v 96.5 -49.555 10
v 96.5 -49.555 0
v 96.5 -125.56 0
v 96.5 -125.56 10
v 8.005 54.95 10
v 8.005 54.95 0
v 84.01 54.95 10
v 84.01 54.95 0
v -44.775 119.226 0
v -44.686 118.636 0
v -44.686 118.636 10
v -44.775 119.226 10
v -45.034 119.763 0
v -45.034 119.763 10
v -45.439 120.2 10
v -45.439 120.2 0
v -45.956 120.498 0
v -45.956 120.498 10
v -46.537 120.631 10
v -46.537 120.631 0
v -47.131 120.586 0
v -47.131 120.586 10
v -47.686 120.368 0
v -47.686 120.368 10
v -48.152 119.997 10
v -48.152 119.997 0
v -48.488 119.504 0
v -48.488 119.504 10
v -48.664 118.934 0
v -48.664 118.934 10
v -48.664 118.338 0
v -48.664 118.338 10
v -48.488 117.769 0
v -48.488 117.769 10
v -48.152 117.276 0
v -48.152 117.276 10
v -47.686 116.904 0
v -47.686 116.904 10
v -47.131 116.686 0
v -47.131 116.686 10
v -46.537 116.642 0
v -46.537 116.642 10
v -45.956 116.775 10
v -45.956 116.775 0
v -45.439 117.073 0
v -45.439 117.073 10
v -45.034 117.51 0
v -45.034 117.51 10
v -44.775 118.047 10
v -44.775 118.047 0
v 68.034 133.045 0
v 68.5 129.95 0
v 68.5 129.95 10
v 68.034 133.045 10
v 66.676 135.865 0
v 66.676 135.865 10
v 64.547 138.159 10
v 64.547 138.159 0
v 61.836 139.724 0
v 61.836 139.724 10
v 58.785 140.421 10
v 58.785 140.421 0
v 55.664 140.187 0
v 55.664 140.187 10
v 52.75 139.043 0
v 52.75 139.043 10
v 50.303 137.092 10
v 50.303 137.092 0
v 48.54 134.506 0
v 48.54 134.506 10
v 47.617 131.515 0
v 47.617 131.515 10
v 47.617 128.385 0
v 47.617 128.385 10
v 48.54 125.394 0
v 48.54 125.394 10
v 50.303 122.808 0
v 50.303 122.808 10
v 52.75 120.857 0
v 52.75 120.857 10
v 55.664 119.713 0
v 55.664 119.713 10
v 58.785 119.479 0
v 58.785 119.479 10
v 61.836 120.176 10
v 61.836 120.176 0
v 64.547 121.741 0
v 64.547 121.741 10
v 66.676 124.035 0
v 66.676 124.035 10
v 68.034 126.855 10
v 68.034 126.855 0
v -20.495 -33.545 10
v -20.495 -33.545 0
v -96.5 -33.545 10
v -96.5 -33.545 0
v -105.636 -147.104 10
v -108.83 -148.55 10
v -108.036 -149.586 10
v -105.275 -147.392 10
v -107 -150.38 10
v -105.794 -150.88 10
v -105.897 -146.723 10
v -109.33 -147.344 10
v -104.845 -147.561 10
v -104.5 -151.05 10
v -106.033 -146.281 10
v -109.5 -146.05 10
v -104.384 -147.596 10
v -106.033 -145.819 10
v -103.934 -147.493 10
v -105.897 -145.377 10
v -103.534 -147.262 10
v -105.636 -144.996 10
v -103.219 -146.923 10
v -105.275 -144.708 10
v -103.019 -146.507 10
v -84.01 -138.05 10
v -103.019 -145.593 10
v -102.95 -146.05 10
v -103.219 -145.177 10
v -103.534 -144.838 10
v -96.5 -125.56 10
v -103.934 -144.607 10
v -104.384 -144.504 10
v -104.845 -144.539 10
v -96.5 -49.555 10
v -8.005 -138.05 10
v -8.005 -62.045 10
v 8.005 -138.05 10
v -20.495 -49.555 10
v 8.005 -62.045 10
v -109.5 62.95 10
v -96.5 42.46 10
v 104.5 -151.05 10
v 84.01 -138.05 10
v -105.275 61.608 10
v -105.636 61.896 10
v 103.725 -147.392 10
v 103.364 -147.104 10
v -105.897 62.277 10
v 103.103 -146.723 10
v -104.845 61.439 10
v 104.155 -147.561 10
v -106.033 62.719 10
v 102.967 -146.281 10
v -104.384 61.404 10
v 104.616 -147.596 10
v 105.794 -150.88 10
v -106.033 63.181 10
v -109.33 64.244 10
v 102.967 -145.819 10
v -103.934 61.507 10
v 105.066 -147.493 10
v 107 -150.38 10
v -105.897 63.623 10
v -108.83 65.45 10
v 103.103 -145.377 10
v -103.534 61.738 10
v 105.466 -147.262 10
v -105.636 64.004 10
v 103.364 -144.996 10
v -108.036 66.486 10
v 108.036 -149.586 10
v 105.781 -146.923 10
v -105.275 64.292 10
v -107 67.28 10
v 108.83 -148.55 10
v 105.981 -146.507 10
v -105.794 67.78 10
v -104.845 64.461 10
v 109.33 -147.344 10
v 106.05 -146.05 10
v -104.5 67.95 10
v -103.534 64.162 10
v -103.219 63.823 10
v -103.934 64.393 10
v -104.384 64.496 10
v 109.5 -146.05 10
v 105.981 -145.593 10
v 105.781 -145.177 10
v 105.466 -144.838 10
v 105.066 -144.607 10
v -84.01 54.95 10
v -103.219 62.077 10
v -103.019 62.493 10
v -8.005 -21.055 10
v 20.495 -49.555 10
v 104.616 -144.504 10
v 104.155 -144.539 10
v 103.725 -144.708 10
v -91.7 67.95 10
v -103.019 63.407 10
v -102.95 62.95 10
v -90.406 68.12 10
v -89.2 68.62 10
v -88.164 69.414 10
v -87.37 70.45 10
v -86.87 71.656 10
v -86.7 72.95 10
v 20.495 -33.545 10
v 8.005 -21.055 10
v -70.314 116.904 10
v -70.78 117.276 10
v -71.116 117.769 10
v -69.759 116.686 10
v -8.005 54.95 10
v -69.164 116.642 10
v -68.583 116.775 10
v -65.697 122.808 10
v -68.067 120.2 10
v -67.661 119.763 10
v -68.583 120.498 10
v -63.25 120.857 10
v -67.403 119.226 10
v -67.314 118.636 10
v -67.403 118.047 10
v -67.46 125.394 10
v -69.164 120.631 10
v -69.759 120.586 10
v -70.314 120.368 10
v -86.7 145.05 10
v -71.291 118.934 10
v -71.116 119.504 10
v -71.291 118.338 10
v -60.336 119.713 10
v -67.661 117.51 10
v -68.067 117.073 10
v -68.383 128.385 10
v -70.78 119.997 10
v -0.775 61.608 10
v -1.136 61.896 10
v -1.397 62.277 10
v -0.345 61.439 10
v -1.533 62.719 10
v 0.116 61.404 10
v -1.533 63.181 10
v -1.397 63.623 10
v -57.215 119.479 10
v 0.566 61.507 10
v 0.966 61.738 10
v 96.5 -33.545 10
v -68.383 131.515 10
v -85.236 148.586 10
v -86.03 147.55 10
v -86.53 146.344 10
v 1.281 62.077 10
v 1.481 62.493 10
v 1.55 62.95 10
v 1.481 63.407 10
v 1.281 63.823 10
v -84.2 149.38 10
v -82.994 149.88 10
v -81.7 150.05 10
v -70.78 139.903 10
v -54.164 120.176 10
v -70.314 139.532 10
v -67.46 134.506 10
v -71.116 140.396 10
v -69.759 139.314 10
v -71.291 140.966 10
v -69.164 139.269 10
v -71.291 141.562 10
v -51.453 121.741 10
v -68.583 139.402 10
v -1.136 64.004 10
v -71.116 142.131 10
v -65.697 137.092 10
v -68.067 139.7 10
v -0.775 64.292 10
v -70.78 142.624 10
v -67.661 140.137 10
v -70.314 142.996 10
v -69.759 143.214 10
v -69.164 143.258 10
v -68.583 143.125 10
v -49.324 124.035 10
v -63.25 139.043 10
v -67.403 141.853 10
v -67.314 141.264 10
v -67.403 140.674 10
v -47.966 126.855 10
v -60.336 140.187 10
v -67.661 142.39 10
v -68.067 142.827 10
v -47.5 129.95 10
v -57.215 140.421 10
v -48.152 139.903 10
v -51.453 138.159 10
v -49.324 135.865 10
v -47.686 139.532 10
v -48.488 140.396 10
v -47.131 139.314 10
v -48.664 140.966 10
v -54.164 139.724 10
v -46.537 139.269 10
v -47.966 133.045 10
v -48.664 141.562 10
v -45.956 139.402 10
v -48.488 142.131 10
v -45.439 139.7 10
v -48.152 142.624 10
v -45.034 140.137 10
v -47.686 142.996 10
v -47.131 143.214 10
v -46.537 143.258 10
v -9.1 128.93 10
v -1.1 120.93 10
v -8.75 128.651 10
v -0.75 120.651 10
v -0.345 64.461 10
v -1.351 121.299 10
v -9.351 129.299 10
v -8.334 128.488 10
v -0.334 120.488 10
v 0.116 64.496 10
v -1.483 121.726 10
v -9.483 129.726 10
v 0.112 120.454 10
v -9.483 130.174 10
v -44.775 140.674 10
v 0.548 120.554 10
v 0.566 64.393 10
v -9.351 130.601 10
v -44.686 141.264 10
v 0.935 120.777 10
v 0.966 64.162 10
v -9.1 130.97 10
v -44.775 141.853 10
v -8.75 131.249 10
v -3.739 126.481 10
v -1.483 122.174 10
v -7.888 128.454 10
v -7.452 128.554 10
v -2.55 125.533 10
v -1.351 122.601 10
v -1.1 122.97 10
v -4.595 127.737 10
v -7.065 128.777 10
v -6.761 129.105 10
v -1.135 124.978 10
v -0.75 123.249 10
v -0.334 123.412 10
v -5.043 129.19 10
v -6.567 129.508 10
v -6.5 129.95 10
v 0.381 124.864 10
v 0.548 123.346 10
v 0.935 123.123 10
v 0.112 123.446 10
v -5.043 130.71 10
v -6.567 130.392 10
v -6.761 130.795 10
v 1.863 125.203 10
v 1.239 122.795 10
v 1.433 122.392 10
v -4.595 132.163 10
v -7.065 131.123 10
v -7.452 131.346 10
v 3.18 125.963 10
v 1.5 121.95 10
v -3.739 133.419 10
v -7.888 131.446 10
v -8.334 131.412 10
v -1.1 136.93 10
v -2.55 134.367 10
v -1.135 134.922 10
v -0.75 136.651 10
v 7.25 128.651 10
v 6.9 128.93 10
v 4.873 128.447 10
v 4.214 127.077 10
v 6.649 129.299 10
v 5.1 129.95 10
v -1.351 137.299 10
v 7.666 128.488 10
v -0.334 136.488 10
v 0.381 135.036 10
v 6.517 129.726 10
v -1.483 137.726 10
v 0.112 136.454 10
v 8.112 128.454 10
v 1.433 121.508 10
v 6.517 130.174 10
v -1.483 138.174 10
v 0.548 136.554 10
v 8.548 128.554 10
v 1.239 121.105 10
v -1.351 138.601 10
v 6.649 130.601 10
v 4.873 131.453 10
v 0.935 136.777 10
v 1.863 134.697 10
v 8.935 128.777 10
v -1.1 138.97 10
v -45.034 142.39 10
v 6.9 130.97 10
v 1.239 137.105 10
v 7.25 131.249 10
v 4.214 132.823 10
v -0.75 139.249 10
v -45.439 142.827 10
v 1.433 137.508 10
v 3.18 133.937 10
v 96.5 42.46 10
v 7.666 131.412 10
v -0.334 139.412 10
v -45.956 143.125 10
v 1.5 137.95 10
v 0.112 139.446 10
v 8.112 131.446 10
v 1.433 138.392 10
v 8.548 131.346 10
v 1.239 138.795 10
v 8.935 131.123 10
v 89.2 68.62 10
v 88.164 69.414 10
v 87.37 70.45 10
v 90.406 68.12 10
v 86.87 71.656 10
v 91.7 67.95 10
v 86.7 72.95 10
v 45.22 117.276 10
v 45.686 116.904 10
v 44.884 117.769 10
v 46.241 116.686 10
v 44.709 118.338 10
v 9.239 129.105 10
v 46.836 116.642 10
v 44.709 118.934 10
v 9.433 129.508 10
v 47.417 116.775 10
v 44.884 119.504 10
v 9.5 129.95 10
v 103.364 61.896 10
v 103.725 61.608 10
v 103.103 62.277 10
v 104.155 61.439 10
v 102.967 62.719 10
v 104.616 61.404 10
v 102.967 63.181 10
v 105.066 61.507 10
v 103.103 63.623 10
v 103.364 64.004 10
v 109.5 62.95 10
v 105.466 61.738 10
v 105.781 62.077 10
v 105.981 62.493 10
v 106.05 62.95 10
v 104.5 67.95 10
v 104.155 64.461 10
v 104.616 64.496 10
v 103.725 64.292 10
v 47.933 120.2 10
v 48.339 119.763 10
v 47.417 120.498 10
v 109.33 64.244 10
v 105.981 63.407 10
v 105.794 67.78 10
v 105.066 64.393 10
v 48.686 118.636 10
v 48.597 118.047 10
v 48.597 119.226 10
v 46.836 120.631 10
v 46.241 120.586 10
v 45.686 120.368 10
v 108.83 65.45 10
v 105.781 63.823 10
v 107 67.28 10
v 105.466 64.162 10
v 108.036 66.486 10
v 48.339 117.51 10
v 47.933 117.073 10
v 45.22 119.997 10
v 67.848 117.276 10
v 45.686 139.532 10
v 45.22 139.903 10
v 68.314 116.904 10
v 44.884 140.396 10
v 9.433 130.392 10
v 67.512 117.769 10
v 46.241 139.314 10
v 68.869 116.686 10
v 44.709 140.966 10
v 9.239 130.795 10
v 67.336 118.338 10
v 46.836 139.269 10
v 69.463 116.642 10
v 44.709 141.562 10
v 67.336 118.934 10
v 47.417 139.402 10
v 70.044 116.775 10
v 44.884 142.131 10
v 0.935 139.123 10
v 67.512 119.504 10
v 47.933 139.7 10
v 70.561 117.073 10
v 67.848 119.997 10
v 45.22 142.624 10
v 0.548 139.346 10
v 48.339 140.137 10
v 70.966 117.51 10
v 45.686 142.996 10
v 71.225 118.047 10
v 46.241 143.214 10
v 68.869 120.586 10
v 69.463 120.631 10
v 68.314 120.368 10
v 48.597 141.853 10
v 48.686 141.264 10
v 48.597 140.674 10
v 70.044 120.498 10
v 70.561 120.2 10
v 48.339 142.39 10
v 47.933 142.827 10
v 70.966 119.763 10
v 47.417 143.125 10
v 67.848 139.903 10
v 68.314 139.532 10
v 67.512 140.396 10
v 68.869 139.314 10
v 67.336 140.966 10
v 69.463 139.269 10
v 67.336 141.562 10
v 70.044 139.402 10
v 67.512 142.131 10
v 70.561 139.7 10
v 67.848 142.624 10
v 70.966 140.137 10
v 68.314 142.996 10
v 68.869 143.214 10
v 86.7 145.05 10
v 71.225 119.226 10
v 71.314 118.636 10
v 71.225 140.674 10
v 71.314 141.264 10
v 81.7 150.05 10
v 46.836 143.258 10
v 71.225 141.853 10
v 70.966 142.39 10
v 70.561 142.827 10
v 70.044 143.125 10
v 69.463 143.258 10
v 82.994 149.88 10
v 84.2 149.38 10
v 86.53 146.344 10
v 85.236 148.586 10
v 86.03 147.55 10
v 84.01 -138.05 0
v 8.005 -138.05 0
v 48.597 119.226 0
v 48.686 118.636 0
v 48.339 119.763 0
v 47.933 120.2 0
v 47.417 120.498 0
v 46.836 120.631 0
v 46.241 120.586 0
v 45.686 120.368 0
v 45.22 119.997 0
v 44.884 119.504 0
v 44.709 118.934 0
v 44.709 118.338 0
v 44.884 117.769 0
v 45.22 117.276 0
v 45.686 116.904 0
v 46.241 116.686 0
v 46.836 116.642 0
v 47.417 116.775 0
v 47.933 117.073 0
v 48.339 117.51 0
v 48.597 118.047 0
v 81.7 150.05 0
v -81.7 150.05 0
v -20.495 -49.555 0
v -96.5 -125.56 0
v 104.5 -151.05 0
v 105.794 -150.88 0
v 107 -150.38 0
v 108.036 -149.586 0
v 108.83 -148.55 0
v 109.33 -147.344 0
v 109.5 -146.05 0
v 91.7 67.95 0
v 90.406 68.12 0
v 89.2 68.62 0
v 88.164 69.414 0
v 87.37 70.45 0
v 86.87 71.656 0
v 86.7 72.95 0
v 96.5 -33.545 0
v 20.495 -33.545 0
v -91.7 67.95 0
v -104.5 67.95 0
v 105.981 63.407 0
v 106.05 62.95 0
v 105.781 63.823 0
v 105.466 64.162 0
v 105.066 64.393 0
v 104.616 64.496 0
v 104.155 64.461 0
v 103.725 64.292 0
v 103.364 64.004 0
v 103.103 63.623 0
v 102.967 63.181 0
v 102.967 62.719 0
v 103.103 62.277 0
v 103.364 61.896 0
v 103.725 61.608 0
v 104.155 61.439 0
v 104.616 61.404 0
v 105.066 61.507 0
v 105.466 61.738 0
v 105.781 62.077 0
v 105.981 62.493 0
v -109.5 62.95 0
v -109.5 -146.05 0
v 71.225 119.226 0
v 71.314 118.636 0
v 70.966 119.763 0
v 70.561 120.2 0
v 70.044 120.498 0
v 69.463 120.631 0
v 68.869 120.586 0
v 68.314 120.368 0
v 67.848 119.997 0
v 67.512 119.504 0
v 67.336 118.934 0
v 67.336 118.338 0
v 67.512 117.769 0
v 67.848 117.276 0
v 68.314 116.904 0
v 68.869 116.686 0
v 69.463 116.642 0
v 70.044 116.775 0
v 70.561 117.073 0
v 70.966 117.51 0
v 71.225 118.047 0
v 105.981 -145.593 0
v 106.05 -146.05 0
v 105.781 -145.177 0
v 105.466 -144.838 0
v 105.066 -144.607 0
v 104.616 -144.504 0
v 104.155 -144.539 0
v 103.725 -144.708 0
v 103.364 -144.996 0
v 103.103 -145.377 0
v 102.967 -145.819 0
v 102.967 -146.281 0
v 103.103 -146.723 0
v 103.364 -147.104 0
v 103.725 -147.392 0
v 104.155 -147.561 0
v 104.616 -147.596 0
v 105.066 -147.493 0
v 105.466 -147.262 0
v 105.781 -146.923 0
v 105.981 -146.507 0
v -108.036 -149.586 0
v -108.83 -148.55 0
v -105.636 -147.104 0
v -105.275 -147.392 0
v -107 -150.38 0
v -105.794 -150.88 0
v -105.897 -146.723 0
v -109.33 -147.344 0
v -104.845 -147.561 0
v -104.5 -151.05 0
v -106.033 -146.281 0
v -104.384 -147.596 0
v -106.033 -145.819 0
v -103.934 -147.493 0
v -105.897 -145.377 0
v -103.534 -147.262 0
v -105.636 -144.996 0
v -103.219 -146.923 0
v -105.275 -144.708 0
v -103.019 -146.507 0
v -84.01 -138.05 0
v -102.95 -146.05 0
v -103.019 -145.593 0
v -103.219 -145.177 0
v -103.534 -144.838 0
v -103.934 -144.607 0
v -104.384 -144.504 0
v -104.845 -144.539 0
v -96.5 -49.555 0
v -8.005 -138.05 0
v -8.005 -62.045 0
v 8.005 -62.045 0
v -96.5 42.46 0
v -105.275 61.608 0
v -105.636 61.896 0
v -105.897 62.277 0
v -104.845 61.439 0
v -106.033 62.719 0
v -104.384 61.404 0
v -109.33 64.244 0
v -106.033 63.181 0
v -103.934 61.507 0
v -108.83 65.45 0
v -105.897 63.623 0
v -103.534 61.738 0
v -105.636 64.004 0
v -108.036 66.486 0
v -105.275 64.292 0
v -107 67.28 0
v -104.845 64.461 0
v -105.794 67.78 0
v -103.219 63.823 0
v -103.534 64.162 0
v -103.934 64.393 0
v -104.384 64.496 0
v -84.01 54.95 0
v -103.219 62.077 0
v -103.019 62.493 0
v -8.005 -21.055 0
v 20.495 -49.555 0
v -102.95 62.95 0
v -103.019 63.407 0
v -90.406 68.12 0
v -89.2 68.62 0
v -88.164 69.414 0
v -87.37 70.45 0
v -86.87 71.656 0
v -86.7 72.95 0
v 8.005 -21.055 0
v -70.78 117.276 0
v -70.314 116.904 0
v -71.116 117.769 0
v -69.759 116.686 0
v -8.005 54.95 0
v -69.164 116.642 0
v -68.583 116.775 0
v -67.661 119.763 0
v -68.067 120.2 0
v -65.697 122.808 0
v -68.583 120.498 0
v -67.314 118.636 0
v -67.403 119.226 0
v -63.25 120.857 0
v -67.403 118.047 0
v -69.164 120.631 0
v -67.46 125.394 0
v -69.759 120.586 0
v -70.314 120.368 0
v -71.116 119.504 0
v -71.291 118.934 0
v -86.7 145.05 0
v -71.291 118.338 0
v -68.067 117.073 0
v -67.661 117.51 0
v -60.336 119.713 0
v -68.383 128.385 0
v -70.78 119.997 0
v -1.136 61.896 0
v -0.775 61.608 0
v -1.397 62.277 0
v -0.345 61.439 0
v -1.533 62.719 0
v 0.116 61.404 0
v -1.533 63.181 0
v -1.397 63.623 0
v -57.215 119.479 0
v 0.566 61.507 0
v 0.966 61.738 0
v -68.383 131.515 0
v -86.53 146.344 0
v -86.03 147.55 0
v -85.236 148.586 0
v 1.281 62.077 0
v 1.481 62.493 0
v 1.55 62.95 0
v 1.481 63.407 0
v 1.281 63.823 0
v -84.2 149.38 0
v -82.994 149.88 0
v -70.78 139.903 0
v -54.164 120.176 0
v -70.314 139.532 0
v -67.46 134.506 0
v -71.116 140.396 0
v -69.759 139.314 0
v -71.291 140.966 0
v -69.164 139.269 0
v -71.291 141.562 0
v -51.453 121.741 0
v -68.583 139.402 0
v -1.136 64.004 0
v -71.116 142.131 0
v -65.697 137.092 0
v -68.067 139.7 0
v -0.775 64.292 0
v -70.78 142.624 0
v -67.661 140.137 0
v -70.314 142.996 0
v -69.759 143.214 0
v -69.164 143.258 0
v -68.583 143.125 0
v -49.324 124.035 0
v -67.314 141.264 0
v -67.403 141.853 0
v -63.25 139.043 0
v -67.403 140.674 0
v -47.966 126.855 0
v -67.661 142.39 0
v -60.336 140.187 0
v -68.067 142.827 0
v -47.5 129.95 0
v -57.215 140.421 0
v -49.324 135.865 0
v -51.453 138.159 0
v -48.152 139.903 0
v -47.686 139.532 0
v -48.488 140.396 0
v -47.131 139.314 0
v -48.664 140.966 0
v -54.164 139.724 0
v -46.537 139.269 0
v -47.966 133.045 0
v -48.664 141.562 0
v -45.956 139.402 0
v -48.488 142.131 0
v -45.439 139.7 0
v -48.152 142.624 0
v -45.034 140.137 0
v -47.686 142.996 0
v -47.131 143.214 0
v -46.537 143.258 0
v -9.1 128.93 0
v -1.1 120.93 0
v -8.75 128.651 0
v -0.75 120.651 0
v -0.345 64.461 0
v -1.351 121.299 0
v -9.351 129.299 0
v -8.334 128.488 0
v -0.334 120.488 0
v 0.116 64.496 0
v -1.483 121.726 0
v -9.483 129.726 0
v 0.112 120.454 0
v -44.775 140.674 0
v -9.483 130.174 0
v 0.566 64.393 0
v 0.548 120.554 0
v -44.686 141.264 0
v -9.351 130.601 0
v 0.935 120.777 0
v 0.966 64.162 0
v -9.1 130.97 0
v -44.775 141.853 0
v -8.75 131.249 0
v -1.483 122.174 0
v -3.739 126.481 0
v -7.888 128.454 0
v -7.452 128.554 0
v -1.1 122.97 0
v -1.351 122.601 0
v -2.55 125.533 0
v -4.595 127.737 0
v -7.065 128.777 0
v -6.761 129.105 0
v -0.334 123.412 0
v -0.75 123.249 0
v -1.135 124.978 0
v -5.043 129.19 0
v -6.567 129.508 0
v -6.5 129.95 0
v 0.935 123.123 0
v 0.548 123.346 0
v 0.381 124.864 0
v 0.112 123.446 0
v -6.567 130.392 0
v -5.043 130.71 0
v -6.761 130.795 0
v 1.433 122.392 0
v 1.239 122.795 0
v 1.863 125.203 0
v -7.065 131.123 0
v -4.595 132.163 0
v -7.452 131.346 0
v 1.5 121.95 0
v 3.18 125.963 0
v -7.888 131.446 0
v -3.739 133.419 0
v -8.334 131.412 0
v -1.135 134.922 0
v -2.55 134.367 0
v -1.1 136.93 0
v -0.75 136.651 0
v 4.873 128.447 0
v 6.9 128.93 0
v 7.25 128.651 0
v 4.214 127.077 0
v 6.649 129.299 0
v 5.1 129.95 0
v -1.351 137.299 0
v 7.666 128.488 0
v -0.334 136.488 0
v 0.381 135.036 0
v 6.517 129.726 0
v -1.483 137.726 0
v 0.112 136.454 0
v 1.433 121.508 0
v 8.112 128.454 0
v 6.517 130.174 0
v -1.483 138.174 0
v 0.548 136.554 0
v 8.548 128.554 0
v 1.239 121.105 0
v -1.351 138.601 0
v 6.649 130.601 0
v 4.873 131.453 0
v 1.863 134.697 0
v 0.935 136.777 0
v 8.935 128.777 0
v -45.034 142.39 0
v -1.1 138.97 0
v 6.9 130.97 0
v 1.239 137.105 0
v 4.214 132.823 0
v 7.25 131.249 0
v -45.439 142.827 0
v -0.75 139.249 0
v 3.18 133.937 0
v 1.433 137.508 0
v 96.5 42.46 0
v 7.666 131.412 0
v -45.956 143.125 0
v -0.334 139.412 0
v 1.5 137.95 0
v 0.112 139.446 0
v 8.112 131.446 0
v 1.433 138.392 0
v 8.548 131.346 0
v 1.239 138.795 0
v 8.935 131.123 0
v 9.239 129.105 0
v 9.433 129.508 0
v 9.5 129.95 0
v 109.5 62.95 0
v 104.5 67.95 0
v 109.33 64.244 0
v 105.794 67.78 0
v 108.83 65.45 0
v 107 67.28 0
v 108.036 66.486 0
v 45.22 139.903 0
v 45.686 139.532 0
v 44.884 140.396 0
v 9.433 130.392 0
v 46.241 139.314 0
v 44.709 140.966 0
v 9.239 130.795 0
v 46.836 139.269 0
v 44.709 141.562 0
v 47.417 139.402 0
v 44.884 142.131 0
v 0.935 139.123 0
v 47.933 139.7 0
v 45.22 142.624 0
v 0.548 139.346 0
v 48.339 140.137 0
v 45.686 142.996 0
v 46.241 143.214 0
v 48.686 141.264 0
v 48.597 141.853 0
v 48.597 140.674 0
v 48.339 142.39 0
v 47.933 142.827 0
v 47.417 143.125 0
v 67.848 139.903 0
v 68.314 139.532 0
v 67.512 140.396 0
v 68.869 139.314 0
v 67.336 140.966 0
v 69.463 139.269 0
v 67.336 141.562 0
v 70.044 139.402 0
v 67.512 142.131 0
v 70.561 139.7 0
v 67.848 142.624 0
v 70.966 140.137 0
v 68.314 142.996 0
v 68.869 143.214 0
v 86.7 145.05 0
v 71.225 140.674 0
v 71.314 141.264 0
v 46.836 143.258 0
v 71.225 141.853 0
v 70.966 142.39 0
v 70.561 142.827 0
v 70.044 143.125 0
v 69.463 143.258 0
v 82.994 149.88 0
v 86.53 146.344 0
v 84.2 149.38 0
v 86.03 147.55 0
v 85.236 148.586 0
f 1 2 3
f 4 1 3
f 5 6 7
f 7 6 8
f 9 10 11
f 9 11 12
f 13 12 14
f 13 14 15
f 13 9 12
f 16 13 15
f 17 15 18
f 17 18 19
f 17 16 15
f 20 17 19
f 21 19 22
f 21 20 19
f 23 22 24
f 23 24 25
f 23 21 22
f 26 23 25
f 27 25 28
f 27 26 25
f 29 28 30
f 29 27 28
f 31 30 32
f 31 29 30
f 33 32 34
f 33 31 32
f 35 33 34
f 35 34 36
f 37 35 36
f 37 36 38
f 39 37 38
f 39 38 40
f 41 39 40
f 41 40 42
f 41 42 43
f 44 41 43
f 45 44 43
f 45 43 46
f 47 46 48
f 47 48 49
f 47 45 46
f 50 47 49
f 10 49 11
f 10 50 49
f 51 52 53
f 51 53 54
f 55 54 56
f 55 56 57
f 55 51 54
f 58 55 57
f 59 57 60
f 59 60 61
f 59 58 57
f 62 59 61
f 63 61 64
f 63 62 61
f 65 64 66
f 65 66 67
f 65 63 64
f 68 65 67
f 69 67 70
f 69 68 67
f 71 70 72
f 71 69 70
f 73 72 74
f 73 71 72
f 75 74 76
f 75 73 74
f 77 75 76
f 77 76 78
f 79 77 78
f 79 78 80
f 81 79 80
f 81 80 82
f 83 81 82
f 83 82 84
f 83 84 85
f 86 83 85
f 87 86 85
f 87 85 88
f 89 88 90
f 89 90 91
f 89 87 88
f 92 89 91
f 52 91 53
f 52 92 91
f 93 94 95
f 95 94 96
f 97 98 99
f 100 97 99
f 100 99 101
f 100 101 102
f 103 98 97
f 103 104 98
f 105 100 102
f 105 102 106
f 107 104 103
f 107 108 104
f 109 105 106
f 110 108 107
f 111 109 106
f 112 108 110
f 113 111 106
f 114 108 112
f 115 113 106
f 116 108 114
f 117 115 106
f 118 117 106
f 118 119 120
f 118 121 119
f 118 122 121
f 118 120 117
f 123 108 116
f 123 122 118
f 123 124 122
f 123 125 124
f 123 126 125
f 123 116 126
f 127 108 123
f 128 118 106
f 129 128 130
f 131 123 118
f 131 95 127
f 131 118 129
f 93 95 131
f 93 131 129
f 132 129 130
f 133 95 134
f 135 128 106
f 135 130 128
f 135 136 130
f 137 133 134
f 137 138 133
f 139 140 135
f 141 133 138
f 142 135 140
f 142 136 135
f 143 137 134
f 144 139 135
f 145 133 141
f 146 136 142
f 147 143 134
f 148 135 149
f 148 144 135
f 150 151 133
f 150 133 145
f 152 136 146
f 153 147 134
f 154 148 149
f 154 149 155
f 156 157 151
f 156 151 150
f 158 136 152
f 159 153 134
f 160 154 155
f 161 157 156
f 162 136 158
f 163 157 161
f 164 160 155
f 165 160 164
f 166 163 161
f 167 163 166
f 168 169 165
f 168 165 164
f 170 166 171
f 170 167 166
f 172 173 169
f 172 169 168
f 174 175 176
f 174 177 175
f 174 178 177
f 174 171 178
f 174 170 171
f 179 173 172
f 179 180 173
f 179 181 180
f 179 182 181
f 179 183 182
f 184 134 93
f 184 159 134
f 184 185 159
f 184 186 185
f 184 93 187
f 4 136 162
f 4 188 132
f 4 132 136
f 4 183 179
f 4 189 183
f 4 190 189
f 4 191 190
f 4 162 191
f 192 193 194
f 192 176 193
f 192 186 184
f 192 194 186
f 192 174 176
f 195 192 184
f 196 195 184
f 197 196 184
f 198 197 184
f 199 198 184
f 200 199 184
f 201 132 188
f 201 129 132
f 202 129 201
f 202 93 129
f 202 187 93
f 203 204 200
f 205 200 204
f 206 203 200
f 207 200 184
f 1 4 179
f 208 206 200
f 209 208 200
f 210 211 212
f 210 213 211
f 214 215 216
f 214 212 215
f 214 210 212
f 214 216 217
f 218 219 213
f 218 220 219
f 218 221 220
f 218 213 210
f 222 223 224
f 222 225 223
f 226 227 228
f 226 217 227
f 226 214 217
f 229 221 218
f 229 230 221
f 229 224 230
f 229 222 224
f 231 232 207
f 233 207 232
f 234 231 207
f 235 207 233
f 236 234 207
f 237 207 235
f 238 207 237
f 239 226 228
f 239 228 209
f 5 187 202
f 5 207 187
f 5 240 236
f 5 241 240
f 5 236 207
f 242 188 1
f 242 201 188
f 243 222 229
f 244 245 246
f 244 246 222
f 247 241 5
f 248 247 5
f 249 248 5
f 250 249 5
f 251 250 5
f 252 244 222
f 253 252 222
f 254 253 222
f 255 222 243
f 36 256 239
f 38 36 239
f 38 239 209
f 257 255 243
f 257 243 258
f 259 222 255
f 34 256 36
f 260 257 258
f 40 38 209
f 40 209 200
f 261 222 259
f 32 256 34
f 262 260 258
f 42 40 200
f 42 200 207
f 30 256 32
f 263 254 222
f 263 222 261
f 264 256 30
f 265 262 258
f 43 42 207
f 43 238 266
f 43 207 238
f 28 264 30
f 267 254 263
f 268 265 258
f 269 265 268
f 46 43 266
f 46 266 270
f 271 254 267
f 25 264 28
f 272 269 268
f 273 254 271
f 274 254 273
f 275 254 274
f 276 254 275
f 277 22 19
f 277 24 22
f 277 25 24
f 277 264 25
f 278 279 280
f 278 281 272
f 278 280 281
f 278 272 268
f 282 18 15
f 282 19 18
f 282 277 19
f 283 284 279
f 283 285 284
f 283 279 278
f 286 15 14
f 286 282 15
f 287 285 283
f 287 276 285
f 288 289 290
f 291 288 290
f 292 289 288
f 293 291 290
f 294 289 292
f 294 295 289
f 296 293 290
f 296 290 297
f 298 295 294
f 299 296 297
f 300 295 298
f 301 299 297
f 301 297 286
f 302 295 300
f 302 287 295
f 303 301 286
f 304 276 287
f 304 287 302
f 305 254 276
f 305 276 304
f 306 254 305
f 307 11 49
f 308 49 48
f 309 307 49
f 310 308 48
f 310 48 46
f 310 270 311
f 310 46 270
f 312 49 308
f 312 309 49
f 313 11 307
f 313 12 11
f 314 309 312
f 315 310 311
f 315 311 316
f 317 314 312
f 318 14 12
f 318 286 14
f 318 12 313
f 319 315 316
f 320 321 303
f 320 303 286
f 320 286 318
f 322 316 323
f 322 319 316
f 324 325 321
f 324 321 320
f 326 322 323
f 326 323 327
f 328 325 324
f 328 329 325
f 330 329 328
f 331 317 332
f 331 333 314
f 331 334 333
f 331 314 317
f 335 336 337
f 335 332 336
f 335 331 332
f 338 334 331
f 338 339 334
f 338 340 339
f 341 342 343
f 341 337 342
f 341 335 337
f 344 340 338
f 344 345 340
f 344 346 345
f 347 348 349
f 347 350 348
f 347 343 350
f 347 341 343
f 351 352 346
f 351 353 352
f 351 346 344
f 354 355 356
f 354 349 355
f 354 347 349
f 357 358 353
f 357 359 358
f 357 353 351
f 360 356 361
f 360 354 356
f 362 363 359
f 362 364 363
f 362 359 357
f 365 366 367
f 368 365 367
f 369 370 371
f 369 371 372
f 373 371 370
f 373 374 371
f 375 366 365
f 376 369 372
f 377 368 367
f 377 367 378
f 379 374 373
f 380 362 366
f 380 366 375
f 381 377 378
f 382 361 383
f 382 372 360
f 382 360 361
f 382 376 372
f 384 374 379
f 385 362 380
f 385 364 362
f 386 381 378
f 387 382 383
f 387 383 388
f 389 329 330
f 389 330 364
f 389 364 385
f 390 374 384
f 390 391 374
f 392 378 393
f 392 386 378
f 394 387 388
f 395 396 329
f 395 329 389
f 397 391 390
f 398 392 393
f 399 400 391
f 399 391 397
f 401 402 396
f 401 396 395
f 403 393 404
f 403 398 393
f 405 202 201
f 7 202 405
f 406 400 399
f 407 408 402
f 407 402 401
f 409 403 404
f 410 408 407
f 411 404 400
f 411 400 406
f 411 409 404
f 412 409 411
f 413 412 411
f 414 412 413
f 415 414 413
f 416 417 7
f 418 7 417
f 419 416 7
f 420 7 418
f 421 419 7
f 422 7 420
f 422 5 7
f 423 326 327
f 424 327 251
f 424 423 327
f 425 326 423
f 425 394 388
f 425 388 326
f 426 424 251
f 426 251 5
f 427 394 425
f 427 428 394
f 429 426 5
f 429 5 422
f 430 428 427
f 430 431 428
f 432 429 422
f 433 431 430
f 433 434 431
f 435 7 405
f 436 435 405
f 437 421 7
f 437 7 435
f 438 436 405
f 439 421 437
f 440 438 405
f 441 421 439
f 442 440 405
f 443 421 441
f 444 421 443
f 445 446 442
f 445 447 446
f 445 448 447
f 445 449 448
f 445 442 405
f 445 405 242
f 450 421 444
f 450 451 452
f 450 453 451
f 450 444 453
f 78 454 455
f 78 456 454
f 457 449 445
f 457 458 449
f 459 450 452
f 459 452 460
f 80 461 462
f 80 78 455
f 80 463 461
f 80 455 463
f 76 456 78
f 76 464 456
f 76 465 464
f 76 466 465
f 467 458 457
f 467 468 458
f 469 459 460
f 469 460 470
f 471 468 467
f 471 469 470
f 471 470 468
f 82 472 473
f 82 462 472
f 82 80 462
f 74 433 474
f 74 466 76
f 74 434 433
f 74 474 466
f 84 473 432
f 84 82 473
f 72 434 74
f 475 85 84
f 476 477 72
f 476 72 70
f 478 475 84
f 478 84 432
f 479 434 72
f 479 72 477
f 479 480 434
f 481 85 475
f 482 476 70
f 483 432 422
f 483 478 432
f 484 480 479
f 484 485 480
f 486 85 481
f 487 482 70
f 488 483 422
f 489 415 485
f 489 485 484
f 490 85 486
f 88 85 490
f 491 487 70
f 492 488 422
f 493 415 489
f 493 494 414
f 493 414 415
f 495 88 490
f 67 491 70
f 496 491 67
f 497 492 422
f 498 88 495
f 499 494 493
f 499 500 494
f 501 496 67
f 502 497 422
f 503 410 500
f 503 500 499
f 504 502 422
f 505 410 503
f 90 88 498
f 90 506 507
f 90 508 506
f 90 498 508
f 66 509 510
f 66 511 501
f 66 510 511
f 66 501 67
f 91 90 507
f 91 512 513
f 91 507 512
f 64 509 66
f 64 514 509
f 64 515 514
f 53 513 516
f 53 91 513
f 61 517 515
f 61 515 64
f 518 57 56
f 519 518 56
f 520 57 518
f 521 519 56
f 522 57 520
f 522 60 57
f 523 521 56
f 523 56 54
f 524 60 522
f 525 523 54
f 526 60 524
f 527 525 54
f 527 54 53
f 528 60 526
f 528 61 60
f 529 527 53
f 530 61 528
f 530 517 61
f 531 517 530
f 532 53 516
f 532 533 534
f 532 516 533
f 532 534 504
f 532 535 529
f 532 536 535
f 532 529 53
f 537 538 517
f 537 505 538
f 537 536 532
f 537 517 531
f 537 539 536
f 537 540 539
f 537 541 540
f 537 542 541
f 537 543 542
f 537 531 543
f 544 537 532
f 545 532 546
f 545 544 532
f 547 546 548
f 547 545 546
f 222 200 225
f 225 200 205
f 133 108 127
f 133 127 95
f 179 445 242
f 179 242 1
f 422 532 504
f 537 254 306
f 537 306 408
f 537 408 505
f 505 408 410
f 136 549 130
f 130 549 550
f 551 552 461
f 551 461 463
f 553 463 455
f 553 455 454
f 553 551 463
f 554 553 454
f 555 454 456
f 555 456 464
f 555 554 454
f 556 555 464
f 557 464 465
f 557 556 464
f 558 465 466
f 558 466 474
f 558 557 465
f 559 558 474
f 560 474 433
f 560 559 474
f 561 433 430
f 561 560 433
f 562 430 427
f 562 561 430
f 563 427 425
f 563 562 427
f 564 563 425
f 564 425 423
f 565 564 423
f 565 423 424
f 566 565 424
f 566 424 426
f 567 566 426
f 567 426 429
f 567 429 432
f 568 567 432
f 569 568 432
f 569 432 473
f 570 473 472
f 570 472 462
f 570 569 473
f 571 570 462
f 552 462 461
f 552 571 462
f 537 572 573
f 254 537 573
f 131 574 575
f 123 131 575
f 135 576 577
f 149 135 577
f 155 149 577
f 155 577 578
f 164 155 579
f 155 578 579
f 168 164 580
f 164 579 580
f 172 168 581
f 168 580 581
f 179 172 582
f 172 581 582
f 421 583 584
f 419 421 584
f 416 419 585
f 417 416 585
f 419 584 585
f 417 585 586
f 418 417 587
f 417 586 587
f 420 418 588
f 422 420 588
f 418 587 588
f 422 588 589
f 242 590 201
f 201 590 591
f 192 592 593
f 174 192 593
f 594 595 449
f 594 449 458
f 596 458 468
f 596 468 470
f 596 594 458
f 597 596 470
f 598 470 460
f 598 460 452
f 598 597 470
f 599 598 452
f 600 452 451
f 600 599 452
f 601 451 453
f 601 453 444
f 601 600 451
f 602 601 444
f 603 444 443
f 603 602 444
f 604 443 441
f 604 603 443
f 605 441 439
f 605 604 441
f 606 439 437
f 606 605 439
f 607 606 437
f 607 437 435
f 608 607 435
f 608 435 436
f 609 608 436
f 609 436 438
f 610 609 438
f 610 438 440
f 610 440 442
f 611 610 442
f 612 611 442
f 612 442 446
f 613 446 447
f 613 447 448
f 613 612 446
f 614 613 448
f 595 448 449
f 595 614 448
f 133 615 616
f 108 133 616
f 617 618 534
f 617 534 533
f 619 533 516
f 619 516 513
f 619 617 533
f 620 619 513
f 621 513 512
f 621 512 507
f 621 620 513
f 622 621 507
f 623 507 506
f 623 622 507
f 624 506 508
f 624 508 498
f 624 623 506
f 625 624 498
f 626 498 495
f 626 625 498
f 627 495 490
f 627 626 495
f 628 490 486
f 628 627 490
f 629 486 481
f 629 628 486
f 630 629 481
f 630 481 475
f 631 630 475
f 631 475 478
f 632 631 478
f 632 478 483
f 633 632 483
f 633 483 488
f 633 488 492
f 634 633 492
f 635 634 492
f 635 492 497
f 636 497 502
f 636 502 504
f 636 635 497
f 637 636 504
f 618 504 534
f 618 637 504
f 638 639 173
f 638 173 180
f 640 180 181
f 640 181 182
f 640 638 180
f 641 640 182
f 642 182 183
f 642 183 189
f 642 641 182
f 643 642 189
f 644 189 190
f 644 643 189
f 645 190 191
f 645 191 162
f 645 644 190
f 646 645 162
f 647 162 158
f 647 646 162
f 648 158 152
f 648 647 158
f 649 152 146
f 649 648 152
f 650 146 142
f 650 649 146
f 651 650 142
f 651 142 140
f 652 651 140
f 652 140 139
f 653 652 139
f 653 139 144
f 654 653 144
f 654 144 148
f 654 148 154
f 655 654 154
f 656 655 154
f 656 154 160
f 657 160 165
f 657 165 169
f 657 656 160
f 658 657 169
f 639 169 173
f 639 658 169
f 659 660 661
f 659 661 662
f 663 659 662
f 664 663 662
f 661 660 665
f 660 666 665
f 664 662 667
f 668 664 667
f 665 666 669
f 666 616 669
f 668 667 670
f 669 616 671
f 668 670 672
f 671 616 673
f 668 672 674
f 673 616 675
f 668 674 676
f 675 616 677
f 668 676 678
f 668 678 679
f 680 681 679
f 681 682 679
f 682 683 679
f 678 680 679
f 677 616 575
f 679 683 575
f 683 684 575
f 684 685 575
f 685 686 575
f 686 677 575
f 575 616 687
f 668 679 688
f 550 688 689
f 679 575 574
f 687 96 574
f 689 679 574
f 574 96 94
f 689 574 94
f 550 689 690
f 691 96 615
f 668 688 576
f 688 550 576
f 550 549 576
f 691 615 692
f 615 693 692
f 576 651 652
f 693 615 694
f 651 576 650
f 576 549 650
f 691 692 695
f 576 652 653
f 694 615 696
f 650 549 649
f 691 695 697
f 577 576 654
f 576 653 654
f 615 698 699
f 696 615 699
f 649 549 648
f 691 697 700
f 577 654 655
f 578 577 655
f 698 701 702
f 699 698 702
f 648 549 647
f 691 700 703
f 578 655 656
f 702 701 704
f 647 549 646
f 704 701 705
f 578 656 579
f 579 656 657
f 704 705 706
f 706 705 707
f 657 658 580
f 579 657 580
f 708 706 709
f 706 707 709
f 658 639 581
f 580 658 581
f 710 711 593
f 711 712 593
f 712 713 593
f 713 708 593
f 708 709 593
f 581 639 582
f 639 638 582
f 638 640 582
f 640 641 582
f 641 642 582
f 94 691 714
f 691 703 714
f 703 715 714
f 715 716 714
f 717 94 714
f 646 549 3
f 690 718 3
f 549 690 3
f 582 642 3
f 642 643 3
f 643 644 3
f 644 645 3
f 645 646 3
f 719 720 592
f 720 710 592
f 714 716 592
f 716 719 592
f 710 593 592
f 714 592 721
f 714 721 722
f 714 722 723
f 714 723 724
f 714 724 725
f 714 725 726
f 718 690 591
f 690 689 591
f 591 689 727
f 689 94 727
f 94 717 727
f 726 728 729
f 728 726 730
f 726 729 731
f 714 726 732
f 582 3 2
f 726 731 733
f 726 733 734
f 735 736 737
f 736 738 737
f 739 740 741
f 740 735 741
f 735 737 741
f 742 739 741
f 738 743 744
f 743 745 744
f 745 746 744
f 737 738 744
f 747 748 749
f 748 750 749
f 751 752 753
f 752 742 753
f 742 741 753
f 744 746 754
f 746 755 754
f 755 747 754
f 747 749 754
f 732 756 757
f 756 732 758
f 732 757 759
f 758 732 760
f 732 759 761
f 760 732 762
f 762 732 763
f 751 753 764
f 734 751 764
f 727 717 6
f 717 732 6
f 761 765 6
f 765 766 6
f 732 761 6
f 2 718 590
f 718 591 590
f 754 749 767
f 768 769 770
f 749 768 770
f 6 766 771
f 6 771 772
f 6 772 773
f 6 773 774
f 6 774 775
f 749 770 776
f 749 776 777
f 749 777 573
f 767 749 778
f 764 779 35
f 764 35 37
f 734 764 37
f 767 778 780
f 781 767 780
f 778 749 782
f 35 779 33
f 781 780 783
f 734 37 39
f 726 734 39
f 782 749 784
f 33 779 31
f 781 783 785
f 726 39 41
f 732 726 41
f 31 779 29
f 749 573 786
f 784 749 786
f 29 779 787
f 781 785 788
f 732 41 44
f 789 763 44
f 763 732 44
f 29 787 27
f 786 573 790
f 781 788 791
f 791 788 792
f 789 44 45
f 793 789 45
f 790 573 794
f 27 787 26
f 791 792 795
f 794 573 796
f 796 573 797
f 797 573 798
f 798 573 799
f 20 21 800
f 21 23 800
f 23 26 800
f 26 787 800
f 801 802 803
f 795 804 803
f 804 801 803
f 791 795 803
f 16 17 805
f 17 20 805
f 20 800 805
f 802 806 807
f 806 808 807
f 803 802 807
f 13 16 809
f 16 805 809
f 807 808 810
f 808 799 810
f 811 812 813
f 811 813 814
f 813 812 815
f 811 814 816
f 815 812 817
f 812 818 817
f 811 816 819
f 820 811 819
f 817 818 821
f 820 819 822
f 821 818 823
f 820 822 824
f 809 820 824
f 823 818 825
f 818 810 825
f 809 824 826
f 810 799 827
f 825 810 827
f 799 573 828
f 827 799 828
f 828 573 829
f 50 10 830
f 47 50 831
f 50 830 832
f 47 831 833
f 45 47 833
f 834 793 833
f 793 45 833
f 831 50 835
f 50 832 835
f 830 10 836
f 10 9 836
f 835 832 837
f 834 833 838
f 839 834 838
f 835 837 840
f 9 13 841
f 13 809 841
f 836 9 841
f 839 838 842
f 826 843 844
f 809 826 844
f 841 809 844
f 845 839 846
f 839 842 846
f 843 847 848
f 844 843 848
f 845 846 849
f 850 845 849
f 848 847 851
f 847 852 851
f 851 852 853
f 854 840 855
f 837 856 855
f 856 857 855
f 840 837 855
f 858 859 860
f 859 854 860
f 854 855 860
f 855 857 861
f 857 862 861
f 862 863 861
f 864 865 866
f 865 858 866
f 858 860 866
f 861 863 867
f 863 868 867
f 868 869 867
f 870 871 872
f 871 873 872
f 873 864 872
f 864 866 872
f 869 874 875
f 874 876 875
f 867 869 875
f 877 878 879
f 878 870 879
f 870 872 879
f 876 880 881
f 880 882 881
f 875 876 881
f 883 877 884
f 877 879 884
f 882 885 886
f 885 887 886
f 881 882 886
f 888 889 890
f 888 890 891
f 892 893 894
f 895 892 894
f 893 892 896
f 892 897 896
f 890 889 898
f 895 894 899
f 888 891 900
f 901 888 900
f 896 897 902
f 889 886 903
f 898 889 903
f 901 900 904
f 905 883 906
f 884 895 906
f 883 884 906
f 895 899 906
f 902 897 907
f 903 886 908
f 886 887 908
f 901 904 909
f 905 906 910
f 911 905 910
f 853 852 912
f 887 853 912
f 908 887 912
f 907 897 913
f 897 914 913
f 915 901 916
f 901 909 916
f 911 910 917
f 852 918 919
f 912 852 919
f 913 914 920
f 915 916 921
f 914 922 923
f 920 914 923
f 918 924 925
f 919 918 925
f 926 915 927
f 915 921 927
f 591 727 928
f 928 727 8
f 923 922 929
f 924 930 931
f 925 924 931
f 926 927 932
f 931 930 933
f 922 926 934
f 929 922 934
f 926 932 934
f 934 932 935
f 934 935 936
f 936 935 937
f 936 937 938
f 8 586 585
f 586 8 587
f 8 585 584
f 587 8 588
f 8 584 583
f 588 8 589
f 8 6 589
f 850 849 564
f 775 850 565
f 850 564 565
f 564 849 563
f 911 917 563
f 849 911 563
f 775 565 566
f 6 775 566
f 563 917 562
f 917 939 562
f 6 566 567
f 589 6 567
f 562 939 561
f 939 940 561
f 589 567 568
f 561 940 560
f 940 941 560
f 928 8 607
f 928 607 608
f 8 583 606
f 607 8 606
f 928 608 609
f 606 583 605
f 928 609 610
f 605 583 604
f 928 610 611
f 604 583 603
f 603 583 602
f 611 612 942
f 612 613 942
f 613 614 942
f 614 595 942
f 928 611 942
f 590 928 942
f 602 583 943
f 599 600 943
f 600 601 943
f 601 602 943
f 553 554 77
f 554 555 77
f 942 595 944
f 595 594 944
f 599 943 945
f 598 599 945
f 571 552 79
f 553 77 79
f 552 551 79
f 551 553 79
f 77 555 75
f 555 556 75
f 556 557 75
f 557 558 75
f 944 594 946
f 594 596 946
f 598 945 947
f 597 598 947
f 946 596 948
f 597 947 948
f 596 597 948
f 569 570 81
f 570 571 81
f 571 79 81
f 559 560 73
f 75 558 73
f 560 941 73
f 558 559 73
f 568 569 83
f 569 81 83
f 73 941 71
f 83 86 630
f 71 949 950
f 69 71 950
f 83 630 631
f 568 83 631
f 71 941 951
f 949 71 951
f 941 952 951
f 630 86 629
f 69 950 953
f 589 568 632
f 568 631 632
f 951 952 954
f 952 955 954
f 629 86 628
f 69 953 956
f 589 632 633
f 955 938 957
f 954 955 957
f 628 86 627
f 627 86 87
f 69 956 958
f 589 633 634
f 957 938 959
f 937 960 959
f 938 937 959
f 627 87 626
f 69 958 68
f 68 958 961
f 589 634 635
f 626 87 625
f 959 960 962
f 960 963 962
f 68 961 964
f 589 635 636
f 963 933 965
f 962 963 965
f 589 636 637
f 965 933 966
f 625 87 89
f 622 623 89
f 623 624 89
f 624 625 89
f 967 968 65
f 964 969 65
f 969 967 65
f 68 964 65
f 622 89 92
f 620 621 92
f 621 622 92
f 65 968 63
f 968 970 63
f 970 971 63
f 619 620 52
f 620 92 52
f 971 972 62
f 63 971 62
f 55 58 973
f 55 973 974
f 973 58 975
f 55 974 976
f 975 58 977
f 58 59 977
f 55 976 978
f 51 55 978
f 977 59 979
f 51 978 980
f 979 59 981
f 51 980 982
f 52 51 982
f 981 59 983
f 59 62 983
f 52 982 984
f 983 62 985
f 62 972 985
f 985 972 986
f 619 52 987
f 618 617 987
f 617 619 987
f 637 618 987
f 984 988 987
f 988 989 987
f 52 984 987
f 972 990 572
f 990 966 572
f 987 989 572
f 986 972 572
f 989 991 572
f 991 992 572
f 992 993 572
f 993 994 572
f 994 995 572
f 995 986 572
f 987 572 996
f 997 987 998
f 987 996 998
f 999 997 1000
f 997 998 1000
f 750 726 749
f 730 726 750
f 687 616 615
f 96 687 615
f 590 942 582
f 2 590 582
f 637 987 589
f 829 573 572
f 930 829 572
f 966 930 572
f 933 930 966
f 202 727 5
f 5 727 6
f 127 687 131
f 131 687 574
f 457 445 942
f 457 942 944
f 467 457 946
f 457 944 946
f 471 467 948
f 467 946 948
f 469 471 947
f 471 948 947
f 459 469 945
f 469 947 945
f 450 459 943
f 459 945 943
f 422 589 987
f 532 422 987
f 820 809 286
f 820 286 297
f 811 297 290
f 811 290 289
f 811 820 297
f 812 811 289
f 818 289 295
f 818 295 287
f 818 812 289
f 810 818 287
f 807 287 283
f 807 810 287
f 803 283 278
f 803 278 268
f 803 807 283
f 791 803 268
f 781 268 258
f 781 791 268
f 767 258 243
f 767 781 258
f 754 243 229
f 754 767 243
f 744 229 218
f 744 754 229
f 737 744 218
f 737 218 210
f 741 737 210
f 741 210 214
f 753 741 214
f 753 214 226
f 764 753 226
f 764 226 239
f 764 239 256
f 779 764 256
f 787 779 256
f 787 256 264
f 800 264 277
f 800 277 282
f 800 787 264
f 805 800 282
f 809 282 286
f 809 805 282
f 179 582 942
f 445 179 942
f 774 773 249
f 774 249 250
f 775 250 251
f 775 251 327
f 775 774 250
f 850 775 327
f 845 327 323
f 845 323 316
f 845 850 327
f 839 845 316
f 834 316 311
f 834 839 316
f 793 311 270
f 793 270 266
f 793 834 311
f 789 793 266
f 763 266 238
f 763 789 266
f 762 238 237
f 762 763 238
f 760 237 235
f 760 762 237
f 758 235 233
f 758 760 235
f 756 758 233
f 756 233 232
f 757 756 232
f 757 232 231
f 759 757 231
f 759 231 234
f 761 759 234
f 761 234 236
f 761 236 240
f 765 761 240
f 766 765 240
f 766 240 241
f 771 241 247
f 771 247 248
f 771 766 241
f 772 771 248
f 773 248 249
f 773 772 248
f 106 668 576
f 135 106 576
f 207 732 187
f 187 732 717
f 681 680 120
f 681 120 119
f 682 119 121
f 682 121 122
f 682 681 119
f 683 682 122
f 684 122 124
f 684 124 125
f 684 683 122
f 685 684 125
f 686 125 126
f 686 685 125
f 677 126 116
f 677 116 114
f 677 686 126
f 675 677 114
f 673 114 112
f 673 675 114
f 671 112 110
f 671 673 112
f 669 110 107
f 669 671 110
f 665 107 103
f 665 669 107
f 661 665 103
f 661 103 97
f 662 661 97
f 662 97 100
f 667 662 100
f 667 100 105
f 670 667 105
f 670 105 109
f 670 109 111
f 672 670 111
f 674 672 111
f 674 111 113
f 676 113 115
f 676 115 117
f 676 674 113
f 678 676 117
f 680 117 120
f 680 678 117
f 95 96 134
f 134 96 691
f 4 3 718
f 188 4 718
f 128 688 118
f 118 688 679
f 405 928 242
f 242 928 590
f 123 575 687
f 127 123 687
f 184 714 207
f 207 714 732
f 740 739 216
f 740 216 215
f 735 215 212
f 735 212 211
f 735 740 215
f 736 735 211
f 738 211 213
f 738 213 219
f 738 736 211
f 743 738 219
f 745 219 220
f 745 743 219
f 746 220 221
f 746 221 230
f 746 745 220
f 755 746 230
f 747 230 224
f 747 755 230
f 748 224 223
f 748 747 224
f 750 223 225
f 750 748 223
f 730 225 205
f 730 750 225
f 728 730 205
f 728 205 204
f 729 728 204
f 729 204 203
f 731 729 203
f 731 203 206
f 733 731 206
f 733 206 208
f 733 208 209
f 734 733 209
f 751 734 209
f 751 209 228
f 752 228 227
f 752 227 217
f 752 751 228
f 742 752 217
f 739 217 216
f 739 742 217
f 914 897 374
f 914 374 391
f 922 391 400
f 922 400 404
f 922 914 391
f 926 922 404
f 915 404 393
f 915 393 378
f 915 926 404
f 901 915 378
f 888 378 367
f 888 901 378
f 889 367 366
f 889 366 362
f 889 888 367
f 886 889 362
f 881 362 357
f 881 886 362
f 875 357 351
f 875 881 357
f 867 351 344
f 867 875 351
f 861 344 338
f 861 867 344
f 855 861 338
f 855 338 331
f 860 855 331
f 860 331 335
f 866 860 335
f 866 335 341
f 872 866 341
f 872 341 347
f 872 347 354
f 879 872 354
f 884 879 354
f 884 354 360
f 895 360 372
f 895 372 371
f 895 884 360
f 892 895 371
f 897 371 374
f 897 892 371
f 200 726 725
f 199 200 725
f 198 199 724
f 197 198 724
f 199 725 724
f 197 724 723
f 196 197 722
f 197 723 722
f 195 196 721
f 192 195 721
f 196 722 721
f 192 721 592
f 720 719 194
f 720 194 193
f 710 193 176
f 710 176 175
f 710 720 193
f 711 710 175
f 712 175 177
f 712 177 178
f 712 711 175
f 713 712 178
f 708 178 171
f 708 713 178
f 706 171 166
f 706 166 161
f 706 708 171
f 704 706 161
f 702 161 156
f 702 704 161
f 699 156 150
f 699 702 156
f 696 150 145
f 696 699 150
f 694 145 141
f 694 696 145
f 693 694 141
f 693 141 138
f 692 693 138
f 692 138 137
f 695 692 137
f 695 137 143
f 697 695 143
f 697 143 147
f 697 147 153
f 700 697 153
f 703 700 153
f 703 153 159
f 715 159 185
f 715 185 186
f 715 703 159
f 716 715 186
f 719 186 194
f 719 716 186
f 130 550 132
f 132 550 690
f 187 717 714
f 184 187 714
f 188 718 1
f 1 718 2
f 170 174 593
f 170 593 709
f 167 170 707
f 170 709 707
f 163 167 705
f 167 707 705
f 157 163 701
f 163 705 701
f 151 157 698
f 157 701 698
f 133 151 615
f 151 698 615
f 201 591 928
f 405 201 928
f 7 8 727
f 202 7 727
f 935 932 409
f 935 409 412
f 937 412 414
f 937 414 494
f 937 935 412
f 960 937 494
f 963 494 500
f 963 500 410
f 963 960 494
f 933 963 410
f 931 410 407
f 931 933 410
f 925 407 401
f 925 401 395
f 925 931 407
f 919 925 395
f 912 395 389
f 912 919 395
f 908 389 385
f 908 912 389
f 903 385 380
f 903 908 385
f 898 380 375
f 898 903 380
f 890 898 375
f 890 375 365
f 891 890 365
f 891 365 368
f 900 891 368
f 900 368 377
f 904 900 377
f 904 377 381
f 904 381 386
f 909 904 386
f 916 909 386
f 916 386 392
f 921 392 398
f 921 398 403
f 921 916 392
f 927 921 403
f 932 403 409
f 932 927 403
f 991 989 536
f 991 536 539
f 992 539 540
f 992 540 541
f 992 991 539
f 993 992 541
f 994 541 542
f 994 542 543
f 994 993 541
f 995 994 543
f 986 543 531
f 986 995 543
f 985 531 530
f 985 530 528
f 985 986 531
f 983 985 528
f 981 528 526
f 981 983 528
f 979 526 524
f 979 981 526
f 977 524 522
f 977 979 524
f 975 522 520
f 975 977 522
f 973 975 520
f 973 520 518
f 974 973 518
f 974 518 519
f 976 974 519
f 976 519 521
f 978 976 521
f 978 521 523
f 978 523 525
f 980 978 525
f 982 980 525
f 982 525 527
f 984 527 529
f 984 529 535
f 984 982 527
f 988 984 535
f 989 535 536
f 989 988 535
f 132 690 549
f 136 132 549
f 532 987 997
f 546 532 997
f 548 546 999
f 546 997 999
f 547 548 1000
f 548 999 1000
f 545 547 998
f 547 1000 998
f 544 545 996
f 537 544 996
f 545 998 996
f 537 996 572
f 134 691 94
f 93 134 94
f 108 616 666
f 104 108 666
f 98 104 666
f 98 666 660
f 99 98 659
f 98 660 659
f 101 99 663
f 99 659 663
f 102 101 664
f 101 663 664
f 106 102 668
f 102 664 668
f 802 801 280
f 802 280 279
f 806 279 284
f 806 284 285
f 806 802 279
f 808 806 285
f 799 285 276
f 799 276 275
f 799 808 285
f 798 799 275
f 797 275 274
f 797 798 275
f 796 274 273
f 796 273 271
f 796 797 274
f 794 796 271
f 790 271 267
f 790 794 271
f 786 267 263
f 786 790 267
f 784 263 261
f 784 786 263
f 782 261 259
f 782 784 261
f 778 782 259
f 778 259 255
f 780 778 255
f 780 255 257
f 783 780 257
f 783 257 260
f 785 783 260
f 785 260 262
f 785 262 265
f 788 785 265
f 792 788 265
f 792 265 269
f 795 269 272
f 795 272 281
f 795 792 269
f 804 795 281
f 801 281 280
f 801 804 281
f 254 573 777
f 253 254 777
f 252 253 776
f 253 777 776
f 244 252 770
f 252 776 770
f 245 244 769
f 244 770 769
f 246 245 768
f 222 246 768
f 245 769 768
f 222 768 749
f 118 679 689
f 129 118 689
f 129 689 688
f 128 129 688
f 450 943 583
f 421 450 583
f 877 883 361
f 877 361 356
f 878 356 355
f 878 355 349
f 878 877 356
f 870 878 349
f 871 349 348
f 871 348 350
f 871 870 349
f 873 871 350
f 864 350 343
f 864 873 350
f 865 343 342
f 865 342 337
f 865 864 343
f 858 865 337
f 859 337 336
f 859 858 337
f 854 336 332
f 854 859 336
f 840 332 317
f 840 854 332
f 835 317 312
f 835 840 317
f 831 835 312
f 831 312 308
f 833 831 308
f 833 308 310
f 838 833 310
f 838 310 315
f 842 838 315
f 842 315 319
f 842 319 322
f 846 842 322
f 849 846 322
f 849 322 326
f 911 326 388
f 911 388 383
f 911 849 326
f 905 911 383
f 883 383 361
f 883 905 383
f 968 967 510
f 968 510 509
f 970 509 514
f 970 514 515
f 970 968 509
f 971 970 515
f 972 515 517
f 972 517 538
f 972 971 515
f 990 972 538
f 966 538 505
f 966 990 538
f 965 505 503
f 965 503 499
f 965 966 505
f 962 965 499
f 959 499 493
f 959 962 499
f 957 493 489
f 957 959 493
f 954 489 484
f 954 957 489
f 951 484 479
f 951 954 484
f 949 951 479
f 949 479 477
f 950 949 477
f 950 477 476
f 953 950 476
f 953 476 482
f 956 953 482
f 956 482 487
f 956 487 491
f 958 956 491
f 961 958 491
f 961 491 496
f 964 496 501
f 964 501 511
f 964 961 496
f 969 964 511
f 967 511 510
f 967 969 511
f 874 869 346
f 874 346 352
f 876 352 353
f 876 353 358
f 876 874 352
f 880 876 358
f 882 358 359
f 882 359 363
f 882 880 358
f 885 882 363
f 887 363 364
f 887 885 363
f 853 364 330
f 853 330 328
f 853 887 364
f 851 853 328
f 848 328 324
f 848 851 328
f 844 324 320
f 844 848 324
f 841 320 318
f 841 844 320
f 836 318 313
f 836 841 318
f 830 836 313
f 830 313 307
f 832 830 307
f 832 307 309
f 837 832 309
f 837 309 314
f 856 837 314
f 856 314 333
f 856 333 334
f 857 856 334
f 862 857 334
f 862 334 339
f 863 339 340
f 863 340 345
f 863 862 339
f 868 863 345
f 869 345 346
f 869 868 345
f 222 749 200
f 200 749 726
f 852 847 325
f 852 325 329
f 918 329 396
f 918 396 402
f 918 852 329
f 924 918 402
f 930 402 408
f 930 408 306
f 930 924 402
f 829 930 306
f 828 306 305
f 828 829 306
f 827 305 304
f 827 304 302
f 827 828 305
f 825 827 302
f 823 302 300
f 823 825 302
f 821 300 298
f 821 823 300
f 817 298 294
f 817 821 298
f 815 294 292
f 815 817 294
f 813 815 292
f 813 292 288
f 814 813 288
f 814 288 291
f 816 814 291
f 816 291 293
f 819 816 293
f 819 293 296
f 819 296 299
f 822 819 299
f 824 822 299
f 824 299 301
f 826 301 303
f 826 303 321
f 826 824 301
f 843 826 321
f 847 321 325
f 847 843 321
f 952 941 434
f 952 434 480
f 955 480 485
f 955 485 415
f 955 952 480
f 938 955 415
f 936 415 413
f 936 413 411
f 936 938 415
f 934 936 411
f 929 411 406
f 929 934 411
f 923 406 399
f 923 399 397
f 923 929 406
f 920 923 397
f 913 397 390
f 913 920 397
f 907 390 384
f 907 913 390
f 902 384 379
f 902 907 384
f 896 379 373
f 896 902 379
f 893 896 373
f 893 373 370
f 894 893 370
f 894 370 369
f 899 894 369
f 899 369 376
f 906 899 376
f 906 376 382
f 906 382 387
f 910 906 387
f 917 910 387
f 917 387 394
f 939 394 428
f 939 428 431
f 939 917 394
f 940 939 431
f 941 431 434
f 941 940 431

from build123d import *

# Parameters (mm, degrees)
F0_R     = 1.55
F0_R_2   = 2
F0_R_3   = 10.5
F0_R_4   = 1.5
F0_R_5   = 5.1
F1_DEPTH = 10


with BuildPart() as f1:
    # F0 (on Top) → F1 (new body)
    with BuildSketch(Plane.XY):
        with BuildLine():
            ThreePointArc((-81.7, 150.05), (-85.235534, 148.585534), (-86.7, 145.05))
            Line((-86.7, 145.05), (-86.7, 72.95))
            ThreePointArc((-86.7, 72.95), (-88.164466, 69.414466), (-91.7, 67.95))
            Line((-91.7, 67.95), (-104.5, 67.95))
            ThreePointArc((-104.5, 67.95), (-108.035534, 66.485534), (-109.5, 62.95))
            Line((-109.5, 62.95), (-109.5, -146.05))
            ThreePointArc((-109.5, -146.05), (-108.035534, -149.585534), (-104.5, -151.05))
            Line((-104.5, -151.05), (104.5, -151.05))
            ThreePointArc((104.5, -151.05), (108.035534, -149.585534), (109.5, -146.05))
            Line((109.5, -146.05), (109.5, 62.95))
            ThreePointArc((109.5, 62.95), (108.035534, 66.485534), (104.5, 67.95))
            Line((104.5, 67.95), (91.7, 67.95))
            ThreePointArc((91.7, 67.95), (88.164466, 69.414466), (86.7, 72.95))
            Line((86.7, 72.95), (86.7, 145.05))
            ThreePointArc((86.7, 145.05), (85.235534, 148.585534), (81.7, 150.05))
            Line((81.7, 150.05), (-81.7, 150.05))
        make_face()
        with Locations((-104.5, -146.05)):
            Circle(F0_R, mode=Mode.SUBTRACT)
        Polygon((-96.5, -125.559945), (-96.5, -49.554576), (-20.49463, -49.554576), align=None, mode=Mode.SUBTRACT)
        Polygon((-84.009945, -138.05), (-8.004576, -62.04463), (-8.004576, -138.05), align=None, mode=Mode.SUBTRACT)
        Polygon((8.004576, -62.04463), (84.009945, -138.05), (8.004576, -138.05), align=None, mode=Mode.SUBTRACT)
        with Locations((104.5, -146.05)):
            Circle(F0_R, mode=Mode.SUBTRACT)
        Polygon((96.5, -49.554576), (96.5, -125.559945), (20.49463, -49.554576), align=None, mode=Mode.SUBTRACT)
        Polygon((-96.5, -33.545424), (-96.5, 42.459945), (-20.49463, -33.545424), align=None, mode=Mode.SUBTRACT)
        with Locations((-104.5, 62.95)):
            Circle(F0_R, mode=Mode.SUBTRACT)
        Polygon((-8.004576, -21.05537), (-84.009945, 54.95), (-8.004576, 54.95), align=None, mode=Mode.SUBTRACT)
        with Locations((-69.313708, 118.636292)):
            Circle(F0_R_2, mode=Mode.SUBTRACT)
        with Locations((-58, 129.95)):
            Circle(F0_R_3, mode=Mode.SUBTRACT)
        with Locations((-69.313708, 141.263708)):
            Circle(F0_R_2, mode=Mode.SUBTRACT)
        with Locations((-46.686292, 118.636292)):
            Circle(F0_R_2, mode=Mode.SUBTRACT)
        with Locations((-46.686292, 141.263708)):
            Circle(F0_R_2, mode=Mode.SUBTRACT)
        with Locations((-8, 129.95)):
            Circle(F0_R_4, mode=Mode.SUBTRACT)
        Polygon((84.009945, 54.95), (8.004576, -21.05537), (8.004576, 54.95), align=None, mode=Mode.SUBTRACT)
        with Locations((0, 62.95)):
            Circle(F0_R, mode=Mode.SUBTRACT)
        Polygon((96.5, -33.545424), (20.49463, -33.545424), (96.5, 42.459945), align=None, mode=Mode.SUBTRACT)
        with Locations((104.5, 62.95)):
            Circle(F0_R, mode=Mode.SUBTRACT)
        with Locations((0, 121.95)):
            Circle(F0_R_4, mode=Mode.SUBTRACT)
        with Locations((0, 129.95)):
            Circle(F0_R_5, mode=Mode.SUBTRACT)
        with Locations((8, 129.95)):
            Circle(F0_R_4, mode=Mode.SUBTRACT)
        with Locations((0, 137.95)):
            Circle(F0_R_4, mode=Mode.SUBTRACT)
        with Locations((46.686292, 118.636292)):
            Circle(F0_R_2, mode=Mode.SUBTRACT)
        with Locations((46.686292, 141.263708)):
            Circle(F0_R_2, mode=Mode.SUBTRACT)
        with Locations((58, 129.95)):
            Circle(F0_R_3, mode=Mode.SUBTRACT)
        with Locations((69.313708, 118.636292)):
            Circle(F0_R_2, mode=Mode.SUBTRACT)
        with Locations((69.313708, 141.263708)):
            Circle(F0_R_2, mode=Mode.SUBTRACT)
    extrude(amount=F1_DEPTH)


solid = f1.part
